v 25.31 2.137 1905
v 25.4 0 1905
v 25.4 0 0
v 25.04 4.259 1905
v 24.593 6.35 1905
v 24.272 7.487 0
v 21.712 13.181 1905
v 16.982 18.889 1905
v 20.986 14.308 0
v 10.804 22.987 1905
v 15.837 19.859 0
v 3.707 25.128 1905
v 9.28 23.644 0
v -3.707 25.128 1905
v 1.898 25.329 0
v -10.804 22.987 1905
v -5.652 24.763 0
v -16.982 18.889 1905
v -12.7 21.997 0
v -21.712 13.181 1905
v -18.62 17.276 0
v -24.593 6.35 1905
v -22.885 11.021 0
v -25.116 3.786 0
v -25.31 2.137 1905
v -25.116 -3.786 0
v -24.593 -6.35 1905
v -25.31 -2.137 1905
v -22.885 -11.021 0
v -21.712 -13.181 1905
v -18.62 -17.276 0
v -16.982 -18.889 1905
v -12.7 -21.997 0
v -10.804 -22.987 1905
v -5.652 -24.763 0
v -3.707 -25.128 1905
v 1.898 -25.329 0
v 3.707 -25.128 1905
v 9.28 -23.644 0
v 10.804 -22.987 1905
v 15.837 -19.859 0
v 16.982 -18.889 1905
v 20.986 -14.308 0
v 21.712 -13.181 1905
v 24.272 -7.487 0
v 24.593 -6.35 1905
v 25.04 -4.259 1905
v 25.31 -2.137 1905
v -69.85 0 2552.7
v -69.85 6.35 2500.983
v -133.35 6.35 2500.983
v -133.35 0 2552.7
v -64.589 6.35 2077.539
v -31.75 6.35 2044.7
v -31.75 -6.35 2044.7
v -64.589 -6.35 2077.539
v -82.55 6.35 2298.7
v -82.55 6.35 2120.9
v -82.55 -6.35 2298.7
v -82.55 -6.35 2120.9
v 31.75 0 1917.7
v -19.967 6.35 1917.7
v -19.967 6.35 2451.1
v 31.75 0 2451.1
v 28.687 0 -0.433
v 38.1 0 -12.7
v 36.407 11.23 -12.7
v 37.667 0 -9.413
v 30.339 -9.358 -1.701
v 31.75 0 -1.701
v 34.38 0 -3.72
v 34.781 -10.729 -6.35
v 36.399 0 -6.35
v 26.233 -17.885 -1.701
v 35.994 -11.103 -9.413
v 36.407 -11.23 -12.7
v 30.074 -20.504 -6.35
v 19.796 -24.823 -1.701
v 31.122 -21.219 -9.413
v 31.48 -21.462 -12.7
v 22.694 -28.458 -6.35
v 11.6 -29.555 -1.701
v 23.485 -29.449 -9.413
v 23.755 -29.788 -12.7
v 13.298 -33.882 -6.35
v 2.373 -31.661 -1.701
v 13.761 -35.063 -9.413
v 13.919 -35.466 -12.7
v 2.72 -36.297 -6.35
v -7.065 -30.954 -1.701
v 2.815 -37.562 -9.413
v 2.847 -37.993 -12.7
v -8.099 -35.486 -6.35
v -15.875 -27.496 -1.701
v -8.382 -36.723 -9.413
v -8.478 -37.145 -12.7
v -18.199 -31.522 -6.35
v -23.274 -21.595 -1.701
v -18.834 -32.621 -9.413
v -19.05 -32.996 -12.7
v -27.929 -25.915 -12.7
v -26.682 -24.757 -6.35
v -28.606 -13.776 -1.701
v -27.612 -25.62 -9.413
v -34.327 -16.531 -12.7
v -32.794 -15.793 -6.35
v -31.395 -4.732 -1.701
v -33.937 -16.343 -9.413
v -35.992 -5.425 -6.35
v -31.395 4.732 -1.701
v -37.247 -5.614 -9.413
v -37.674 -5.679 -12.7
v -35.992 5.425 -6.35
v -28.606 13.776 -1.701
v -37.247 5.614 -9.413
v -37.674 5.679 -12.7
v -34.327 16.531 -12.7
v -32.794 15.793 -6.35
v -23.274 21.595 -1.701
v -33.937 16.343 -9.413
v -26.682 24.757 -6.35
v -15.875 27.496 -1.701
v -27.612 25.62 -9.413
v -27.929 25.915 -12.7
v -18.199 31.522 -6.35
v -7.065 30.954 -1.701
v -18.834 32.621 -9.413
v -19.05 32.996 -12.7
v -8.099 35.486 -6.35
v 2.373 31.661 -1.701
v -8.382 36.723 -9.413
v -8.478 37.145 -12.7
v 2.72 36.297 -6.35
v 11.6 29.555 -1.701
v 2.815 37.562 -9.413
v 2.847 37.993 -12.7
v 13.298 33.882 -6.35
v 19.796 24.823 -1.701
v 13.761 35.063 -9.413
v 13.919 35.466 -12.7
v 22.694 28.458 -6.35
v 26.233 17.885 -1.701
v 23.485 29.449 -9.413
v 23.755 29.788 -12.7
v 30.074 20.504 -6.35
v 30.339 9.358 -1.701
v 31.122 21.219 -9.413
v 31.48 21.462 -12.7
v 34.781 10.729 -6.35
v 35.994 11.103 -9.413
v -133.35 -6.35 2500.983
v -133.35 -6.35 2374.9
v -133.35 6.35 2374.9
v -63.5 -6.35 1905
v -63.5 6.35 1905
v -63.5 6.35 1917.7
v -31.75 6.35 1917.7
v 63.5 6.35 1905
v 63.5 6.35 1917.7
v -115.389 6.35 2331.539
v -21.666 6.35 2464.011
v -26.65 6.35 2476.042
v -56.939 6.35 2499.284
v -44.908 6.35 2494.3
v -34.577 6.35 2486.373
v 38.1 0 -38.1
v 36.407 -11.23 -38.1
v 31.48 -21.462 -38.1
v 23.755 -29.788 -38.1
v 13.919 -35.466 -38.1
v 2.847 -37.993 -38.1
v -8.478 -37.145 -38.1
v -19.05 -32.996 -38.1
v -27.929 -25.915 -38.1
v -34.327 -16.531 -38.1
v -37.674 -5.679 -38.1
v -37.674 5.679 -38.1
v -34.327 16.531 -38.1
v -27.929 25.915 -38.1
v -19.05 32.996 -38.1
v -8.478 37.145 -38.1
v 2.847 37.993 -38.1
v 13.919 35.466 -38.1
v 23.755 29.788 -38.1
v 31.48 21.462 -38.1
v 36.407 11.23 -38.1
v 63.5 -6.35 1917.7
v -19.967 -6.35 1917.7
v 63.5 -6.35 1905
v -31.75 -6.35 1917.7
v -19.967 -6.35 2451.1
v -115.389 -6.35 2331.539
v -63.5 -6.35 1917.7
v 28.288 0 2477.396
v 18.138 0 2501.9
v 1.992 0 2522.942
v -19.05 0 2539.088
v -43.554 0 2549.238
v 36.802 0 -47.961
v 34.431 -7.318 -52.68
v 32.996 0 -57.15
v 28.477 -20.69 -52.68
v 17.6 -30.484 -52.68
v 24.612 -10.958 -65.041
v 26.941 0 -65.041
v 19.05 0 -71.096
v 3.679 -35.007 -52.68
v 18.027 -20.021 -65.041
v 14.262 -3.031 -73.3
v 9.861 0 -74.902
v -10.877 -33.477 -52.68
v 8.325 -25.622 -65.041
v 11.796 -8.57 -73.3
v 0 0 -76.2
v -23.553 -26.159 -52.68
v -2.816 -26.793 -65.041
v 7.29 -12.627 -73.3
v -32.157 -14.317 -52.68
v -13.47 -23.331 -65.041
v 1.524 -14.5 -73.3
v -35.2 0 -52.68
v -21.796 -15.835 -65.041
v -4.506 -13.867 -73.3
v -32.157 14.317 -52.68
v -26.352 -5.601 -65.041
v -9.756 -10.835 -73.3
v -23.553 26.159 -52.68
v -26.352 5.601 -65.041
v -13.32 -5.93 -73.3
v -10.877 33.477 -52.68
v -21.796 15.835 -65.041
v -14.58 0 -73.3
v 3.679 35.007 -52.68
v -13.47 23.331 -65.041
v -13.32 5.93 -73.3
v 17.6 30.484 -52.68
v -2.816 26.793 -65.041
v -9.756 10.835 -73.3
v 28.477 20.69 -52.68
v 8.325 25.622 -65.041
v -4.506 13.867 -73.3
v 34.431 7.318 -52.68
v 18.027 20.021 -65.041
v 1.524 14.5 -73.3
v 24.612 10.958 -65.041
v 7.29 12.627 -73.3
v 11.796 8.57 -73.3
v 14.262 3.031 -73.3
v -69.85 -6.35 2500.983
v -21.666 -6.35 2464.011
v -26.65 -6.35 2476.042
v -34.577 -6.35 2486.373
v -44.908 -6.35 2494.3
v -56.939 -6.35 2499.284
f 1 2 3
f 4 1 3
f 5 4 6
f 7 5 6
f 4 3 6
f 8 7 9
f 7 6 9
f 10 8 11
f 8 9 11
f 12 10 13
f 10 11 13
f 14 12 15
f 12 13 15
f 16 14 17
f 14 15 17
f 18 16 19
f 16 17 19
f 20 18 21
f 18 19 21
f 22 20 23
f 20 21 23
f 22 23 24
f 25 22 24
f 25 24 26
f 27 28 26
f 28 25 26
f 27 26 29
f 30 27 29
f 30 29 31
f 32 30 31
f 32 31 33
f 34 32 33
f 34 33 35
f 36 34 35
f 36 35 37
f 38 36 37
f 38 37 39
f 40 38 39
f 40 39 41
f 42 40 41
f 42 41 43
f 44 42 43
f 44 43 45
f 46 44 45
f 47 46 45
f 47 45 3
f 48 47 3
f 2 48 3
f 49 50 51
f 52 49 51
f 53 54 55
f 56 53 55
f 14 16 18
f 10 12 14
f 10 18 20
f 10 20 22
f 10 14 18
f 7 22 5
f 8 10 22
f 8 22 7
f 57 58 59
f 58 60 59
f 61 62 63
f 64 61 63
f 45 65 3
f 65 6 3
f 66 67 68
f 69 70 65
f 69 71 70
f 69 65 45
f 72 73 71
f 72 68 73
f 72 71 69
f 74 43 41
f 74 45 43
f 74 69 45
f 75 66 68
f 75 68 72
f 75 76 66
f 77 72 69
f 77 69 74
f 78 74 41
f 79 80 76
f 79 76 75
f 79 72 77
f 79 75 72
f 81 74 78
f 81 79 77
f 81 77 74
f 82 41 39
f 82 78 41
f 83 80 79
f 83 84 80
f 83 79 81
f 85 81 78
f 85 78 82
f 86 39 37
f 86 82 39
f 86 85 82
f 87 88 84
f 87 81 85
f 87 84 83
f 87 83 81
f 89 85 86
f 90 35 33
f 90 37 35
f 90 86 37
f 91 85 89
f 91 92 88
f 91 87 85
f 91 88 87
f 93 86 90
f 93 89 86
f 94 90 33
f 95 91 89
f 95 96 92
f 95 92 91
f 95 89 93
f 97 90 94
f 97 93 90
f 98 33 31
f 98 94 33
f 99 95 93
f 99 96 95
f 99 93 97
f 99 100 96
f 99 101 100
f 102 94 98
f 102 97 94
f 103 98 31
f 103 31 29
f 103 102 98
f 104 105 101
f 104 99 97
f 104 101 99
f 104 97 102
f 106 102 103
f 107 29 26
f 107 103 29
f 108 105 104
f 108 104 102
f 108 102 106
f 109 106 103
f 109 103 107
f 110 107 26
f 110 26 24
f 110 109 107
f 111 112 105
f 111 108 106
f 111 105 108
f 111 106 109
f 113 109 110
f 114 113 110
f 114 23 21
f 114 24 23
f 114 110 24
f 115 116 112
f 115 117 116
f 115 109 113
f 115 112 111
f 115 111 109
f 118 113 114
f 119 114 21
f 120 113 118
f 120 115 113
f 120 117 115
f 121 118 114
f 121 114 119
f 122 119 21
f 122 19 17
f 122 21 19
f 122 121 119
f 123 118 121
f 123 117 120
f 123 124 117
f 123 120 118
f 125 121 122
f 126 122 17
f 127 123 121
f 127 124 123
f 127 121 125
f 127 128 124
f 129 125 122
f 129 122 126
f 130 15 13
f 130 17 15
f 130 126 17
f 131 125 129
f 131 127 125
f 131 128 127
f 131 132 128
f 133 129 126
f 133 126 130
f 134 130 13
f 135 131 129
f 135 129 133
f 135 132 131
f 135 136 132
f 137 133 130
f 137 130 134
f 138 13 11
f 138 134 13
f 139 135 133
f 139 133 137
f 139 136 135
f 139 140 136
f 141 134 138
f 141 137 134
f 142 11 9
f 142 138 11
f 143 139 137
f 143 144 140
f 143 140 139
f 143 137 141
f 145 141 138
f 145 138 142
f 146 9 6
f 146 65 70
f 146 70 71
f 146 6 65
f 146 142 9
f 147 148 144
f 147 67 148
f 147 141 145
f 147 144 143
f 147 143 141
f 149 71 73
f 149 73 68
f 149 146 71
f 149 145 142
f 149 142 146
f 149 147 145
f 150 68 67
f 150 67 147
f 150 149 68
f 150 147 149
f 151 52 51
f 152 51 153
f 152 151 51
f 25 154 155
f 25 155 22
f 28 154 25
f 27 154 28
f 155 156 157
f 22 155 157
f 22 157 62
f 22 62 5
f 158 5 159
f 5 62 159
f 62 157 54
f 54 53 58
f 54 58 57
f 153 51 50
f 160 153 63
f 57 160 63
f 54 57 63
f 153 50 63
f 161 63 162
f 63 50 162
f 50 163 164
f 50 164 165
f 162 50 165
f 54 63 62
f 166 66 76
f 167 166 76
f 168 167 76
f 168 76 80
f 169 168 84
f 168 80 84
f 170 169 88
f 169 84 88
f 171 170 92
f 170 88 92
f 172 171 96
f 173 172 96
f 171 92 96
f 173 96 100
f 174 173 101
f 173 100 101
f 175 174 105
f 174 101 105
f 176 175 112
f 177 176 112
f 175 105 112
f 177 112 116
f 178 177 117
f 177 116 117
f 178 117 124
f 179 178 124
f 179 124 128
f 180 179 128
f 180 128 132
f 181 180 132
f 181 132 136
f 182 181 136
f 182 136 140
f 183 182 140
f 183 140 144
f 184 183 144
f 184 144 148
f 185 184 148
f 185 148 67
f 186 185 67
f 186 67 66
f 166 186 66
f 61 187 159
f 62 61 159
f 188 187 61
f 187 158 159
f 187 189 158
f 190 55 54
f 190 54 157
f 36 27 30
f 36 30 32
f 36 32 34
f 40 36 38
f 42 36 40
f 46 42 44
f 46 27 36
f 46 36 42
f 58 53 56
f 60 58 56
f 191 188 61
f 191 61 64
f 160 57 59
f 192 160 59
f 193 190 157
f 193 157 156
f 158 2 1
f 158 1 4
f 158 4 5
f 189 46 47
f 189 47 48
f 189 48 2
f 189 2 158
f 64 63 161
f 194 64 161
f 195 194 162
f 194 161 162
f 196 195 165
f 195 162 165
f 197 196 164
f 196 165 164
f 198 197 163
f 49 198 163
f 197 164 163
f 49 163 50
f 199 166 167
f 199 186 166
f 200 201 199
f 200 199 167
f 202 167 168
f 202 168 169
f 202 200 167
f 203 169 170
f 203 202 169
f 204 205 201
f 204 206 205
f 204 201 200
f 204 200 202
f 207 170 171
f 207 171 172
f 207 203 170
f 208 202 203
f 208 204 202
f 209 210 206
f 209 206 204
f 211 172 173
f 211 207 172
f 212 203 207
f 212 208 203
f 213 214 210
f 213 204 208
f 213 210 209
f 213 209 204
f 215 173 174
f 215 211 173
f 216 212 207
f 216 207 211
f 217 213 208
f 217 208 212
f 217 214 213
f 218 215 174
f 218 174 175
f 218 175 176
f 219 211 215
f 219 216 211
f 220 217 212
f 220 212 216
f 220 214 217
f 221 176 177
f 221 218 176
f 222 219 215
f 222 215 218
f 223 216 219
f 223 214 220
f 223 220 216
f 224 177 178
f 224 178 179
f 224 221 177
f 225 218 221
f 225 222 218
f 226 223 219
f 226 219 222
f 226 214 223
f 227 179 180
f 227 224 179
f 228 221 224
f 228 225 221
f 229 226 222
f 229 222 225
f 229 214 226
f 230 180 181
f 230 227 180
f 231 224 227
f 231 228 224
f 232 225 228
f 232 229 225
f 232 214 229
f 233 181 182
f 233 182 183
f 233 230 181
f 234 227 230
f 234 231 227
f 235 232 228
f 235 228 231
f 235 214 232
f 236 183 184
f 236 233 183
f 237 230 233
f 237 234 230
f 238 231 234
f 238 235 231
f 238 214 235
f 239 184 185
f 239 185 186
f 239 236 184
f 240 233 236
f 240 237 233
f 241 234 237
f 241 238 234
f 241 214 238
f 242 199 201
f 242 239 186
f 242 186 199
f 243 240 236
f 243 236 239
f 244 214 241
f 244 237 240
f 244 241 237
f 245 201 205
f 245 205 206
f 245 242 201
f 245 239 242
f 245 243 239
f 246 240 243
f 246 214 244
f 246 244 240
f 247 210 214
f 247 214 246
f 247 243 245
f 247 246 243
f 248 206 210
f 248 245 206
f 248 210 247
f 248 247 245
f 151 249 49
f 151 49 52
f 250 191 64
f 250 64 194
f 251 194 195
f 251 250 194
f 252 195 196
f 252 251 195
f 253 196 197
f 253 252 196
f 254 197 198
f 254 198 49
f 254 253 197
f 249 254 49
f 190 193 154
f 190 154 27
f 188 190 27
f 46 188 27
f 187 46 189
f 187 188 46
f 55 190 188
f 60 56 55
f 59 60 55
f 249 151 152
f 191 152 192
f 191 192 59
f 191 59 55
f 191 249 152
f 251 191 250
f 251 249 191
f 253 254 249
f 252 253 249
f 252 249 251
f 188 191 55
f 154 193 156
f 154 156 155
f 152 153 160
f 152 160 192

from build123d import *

# Parameters (mm, degrees)
F0_R          = 25.4
F1_DEPTH      = 1905
F2_R          = 38.1
F3_DEPTH      = 76.2
F4_W          = 50.8
F4_H          = 254
F5_DEPTH      = 6.35
F5_DEPTH_BACK = 6.35
F6_SIZE       = 50.79999
F7_R          = 101.6
F8_SIZE2      = 51.71659
F8_SIZE       = 6.34999
F9_SIZE       = 25.4
F11_R         = 38.1


# Not quite as in the source:
# - a fillet or chamfer that OpenCascade refuses, or shapes differently, is made with other operations: its cross-section is extruded or revolved along the edge and cut away or added
# - a fillet or chamfer is up to 0.001 mm smaller than in the source, because OpenCascade refuses the exact size


with BuildPart() as f1:
    # F0 (on Top) → F1 (new body)
    with BuildSketch(Plane.XY):
        Circle(F0_R)
    extrude(amount=F1_DEPTH)

    # F2 (on face) → F3 (join)
    with BuildSketch(Plane(origin=(0, 0, 0), x_dir=(1, 0, 0), z_dir=(0, 0, -1))):
        Circle(F2_R)
    extrude(amount=F3_DEPTH)

    # F4 (on Front) → F5 (join, two sides)
    with BuildSketch(Plane.XZ) as f5_sk:
        Polygon((-25.4, 1905), (0, 1905), (25.4, 1905), (63.5, 1905), (63.5, 1917.7), (31.75, 1917.7), (0, 1917.7), (-31.75, 1917.7), (-63.5, 1917.7), (-63.5, 1905), align=None)
        Polygon((0, 1917.7), (31.75, 1917.7), (31.75, 2552.7), (-31.75, 2552.7), (-31.75, 2298.7), (-31.75, 2044.7), (-31.75, 1917.7), align=None)
        with Locations((-57.15, 2171.7)):
            Rectangle(F4_W, F4_H)
        Polygon((-31.75, 2298.7), (-31.75, 2552.7), (-133.35, 2552.7), (-133.35, 2298.7), (-82.55, 2298.7), align=None)
    extrude(amount=F5_DEPTH)
    extrude(f5_sk.sketch, amount=-F5_DEPTH_BACK)

    # F6 (size 50.8 in the source; OpenCascade refuses exactly that, so slightly less here)
    f6_edges = [f1.edges().sort_by_distance(p)[0] for p in [
        (-133.35, 0, 2298.7),
        (-82.55, 0, 2044.7),
    ]]
    chamfer(f6_edges, length=F6_SIZE)

    # F7
    f7_edges = [f1.edges().sort_by_distance(p)[0] for p in [
        (31.75, 0, 2552.7),
    ]]
    fillet(f7_edges, radius=F7_R)

    # F8 (size 6.35 and 51.7165998176 in the source; OpenCascade refuses exactly that, so slightly less here)
    f8_edges = [f1.edges().sort_by_distance(p)[0] for p in [
        (31.75, 6.35, 2184.4),
        (31.75, -6.35, 2184.4),
    ]]
    f8_side = f1.faces().sort_by_distance((31.75, 0, 2184.4))[0]
    chamfer(f8_edges, length=F8_SIZE, length2=F8_SIZE2, reference=f8_side)

    # F9
    f9_edges = [f1.edges().sort_by_distance(p)[0] for p in [
        (-133.35, 0, 2349.49999),
        (-82.55, 0, 2095.49999),
    ]]
    chamfer(f9_edges, length=F9_SIZE)

    # F10: fillet of radius 12.7 on 1 edges, made by hand

    # F10_s1 → F10_t2 (revolve, cut)
    with BuildSketch(Plane.XZ):
        with BuildLine():
            ThreePointArc((25.4, 0), (34.3802561211, -3.7197438789), (38.1, -12.7))
            Line((38.1, -12.7), (38.1, 0))
            Line((38.1, 0), (25.4, 0))
        make_face()
    revolve(axis=Axis((0, 0, 0), (0, 0, -1)), mode=Mode.SUBTRACT)

    # F11
    f11_edges = [f1.edges().sort_by_distance(p)[0] for p in [
        (-38.1, 0, -76.2),
    ]]
    fillet(f11_edges, radius=F11_R)


solid = f1.part
